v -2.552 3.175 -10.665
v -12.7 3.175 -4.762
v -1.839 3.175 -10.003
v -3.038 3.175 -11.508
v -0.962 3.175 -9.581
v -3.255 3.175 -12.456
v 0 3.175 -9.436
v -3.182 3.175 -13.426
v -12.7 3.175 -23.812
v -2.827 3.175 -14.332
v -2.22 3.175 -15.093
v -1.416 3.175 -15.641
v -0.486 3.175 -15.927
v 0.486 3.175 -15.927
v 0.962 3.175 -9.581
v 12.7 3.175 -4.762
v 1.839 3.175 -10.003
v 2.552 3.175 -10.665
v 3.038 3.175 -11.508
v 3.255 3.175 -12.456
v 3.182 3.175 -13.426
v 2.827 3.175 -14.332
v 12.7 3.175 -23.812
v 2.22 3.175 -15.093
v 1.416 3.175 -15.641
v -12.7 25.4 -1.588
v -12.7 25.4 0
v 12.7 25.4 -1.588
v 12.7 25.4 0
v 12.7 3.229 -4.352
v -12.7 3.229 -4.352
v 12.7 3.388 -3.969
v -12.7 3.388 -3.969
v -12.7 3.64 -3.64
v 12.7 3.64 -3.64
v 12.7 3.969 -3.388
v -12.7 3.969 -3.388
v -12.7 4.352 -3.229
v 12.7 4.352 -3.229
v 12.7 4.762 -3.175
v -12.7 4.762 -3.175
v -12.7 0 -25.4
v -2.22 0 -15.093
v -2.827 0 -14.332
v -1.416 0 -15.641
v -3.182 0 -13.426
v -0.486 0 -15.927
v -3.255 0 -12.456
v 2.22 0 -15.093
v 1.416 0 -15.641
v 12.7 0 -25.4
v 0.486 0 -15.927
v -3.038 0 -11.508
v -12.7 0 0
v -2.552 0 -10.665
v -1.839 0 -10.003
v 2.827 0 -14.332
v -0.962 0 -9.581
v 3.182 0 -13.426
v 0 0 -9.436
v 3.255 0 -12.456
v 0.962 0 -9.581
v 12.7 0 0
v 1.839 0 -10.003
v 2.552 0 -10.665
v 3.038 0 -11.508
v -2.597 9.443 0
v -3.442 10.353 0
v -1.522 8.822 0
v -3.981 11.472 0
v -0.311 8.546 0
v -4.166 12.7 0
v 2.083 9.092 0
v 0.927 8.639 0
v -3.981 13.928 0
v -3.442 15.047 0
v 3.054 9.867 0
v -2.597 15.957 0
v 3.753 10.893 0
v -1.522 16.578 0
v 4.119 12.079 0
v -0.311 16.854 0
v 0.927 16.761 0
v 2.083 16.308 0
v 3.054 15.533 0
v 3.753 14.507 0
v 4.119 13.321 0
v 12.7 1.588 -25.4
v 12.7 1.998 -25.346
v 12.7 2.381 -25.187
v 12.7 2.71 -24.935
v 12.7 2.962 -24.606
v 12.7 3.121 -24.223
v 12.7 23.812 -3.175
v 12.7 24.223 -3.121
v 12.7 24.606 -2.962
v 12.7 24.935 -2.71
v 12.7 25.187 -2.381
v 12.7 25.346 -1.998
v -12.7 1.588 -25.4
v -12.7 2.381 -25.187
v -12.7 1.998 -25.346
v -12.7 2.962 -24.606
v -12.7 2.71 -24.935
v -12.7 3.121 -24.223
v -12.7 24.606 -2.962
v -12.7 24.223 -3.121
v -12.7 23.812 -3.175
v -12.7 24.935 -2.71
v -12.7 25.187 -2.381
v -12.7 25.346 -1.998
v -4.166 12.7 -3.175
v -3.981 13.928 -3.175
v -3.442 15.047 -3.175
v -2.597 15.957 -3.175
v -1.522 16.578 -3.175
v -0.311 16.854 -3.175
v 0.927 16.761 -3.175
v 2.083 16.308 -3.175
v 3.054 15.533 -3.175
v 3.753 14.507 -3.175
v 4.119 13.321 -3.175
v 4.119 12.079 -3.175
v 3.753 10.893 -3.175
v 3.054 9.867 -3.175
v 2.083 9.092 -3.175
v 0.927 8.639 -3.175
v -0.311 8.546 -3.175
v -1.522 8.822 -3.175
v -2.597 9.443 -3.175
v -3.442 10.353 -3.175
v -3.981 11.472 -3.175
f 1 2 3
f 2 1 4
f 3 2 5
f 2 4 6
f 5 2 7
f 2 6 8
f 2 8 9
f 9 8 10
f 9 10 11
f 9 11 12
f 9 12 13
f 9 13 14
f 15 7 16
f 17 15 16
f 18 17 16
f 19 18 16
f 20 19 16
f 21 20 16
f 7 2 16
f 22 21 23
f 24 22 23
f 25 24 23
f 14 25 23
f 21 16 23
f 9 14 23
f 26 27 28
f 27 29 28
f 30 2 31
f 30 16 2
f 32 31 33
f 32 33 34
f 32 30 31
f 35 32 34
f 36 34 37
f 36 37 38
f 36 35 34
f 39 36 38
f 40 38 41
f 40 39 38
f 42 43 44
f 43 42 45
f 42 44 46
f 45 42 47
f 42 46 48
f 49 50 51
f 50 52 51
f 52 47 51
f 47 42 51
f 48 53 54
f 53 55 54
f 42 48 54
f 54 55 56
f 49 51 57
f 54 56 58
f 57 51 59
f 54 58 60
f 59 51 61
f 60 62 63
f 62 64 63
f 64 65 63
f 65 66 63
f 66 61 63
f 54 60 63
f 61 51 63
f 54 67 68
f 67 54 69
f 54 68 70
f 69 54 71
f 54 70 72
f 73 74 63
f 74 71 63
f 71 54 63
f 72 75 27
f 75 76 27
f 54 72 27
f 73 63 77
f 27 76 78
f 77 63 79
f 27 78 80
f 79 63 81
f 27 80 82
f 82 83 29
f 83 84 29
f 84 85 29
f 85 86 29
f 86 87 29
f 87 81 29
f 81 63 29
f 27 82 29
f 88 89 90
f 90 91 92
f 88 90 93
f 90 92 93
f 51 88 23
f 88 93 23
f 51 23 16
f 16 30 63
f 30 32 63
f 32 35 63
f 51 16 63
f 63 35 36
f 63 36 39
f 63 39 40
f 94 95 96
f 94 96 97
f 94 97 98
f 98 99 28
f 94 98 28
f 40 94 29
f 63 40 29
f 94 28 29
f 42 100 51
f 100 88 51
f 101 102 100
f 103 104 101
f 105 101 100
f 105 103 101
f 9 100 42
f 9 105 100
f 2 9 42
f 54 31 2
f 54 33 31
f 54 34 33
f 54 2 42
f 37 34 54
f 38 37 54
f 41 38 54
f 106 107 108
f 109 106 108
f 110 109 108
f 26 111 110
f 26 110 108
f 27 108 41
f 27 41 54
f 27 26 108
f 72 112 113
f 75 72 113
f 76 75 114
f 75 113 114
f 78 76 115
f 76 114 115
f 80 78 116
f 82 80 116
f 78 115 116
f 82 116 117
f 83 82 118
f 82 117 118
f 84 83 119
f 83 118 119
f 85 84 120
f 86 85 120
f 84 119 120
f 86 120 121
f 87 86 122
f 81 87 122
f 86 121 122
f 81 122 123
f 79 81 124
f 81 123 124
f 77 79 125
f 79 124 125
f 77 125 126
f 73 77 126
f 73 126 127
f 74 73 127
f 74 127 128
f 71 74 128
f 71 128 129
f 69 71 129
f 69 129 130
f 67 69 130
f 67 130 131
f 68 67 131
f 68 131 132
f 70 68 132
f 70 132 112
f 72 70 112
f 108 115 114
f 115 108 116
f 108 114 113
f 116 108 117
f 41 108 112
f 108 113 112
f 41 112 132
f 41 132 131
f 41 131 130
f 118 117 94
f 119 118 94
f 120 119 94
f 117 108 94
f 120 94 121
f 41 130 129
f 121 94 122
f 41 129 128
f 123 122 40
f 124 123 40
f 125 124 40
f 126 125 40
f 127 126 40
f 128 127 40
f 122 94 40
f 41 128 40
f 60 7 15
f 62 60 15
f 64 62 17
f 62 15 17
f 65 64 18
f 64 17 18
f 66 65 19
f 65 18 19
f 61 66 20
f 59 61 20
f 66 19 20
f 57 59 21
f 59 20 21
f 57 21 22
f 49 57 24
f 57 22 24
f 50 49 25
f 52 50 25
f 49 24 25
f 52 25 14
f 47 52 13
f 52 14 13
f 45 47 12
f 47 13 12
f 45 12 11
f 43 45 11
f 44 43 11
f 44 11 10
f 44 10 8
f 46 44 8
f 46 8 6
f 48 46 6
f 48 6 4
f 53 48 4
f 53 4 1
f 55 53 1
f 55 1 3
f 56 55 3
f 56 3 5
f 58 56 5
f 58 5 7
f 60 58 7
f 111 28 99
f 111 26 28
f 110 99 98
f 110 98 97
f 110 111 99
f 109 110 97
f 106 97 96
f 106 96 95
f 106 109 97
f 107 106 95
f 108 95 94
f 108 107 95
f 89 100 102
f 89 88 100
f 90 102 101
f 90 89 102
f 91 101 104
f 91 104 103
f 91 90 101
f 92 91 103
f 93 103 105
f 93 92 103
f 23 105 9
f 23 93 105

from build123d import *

# Parameters (mm, degrees)
EXTRUDE_THIN1_DEPTH = 12.7
SKETCH2_R           = 4.1656
CUT_EXTRUDE1_DEPTH  = 4.175
SKETCH3_R           = 3.2639
CUT_EXTRUDE2_DEPTH  = 4.175
FILLET1_R           = 1.5875


with BuildPart() as part:
    # Sketch1 → Extrude-Thin1 (new body, symmetric)
    with BuildSketch(Plane(origin=(0, 0, 0), x_dir=(0, 0, -1), z_dir=(1, 0, 0))):
        Polygon((25.4, 0), (0, 0), (0, 25.4), (3.175, 25.4), (3.175, 3.175), (25.4, 3.175), align=None)
    extrude(amount=EXTRUDE_THIN1_DEPTH, both=True)

    # Sketch2 → Cut-Extrude1 (cut, through all)
    with BuildSketch(Plane(origin=(0, 0, -3.175), x_dir=(-1, 0, 0), z_dir=(0, 0, -1))):
        with Locations((0, 12.7)):
            Circle(SKETCH2_R)
    extrude(amount=-CUT_EXTRUDE1_DEPTH, mode=Mode.SUBTRACT)

    # Sketch3 → Cut-Extrude2 (cut, through all)
    with BuildSketch(Plane(origin=(0, 3.175, 0), x_dir=(1, 0, 0), z_dir=(0, 1, 0))):
        with Locations(Location((0, 12.7, 0), (0, 0, 270))):  # turned: the seam where the file's is
            Circle(SKETCH3_R)
    extrude(amount=-CUT_EXTRUDE2_DEPTH, mode=Mode.SUBTRACT)

    # Fillet1
    fillet1_edges = [part.edges().sort_by_distance(p)[0] for p in [
        (0, 25.4, -3.175),
        (0, 3.175, -3.175),
        (0, 3.175, -25.4),
    ]]
    fillet(fillet1_edges, radius=FILLET1_R)


solid = part.part
